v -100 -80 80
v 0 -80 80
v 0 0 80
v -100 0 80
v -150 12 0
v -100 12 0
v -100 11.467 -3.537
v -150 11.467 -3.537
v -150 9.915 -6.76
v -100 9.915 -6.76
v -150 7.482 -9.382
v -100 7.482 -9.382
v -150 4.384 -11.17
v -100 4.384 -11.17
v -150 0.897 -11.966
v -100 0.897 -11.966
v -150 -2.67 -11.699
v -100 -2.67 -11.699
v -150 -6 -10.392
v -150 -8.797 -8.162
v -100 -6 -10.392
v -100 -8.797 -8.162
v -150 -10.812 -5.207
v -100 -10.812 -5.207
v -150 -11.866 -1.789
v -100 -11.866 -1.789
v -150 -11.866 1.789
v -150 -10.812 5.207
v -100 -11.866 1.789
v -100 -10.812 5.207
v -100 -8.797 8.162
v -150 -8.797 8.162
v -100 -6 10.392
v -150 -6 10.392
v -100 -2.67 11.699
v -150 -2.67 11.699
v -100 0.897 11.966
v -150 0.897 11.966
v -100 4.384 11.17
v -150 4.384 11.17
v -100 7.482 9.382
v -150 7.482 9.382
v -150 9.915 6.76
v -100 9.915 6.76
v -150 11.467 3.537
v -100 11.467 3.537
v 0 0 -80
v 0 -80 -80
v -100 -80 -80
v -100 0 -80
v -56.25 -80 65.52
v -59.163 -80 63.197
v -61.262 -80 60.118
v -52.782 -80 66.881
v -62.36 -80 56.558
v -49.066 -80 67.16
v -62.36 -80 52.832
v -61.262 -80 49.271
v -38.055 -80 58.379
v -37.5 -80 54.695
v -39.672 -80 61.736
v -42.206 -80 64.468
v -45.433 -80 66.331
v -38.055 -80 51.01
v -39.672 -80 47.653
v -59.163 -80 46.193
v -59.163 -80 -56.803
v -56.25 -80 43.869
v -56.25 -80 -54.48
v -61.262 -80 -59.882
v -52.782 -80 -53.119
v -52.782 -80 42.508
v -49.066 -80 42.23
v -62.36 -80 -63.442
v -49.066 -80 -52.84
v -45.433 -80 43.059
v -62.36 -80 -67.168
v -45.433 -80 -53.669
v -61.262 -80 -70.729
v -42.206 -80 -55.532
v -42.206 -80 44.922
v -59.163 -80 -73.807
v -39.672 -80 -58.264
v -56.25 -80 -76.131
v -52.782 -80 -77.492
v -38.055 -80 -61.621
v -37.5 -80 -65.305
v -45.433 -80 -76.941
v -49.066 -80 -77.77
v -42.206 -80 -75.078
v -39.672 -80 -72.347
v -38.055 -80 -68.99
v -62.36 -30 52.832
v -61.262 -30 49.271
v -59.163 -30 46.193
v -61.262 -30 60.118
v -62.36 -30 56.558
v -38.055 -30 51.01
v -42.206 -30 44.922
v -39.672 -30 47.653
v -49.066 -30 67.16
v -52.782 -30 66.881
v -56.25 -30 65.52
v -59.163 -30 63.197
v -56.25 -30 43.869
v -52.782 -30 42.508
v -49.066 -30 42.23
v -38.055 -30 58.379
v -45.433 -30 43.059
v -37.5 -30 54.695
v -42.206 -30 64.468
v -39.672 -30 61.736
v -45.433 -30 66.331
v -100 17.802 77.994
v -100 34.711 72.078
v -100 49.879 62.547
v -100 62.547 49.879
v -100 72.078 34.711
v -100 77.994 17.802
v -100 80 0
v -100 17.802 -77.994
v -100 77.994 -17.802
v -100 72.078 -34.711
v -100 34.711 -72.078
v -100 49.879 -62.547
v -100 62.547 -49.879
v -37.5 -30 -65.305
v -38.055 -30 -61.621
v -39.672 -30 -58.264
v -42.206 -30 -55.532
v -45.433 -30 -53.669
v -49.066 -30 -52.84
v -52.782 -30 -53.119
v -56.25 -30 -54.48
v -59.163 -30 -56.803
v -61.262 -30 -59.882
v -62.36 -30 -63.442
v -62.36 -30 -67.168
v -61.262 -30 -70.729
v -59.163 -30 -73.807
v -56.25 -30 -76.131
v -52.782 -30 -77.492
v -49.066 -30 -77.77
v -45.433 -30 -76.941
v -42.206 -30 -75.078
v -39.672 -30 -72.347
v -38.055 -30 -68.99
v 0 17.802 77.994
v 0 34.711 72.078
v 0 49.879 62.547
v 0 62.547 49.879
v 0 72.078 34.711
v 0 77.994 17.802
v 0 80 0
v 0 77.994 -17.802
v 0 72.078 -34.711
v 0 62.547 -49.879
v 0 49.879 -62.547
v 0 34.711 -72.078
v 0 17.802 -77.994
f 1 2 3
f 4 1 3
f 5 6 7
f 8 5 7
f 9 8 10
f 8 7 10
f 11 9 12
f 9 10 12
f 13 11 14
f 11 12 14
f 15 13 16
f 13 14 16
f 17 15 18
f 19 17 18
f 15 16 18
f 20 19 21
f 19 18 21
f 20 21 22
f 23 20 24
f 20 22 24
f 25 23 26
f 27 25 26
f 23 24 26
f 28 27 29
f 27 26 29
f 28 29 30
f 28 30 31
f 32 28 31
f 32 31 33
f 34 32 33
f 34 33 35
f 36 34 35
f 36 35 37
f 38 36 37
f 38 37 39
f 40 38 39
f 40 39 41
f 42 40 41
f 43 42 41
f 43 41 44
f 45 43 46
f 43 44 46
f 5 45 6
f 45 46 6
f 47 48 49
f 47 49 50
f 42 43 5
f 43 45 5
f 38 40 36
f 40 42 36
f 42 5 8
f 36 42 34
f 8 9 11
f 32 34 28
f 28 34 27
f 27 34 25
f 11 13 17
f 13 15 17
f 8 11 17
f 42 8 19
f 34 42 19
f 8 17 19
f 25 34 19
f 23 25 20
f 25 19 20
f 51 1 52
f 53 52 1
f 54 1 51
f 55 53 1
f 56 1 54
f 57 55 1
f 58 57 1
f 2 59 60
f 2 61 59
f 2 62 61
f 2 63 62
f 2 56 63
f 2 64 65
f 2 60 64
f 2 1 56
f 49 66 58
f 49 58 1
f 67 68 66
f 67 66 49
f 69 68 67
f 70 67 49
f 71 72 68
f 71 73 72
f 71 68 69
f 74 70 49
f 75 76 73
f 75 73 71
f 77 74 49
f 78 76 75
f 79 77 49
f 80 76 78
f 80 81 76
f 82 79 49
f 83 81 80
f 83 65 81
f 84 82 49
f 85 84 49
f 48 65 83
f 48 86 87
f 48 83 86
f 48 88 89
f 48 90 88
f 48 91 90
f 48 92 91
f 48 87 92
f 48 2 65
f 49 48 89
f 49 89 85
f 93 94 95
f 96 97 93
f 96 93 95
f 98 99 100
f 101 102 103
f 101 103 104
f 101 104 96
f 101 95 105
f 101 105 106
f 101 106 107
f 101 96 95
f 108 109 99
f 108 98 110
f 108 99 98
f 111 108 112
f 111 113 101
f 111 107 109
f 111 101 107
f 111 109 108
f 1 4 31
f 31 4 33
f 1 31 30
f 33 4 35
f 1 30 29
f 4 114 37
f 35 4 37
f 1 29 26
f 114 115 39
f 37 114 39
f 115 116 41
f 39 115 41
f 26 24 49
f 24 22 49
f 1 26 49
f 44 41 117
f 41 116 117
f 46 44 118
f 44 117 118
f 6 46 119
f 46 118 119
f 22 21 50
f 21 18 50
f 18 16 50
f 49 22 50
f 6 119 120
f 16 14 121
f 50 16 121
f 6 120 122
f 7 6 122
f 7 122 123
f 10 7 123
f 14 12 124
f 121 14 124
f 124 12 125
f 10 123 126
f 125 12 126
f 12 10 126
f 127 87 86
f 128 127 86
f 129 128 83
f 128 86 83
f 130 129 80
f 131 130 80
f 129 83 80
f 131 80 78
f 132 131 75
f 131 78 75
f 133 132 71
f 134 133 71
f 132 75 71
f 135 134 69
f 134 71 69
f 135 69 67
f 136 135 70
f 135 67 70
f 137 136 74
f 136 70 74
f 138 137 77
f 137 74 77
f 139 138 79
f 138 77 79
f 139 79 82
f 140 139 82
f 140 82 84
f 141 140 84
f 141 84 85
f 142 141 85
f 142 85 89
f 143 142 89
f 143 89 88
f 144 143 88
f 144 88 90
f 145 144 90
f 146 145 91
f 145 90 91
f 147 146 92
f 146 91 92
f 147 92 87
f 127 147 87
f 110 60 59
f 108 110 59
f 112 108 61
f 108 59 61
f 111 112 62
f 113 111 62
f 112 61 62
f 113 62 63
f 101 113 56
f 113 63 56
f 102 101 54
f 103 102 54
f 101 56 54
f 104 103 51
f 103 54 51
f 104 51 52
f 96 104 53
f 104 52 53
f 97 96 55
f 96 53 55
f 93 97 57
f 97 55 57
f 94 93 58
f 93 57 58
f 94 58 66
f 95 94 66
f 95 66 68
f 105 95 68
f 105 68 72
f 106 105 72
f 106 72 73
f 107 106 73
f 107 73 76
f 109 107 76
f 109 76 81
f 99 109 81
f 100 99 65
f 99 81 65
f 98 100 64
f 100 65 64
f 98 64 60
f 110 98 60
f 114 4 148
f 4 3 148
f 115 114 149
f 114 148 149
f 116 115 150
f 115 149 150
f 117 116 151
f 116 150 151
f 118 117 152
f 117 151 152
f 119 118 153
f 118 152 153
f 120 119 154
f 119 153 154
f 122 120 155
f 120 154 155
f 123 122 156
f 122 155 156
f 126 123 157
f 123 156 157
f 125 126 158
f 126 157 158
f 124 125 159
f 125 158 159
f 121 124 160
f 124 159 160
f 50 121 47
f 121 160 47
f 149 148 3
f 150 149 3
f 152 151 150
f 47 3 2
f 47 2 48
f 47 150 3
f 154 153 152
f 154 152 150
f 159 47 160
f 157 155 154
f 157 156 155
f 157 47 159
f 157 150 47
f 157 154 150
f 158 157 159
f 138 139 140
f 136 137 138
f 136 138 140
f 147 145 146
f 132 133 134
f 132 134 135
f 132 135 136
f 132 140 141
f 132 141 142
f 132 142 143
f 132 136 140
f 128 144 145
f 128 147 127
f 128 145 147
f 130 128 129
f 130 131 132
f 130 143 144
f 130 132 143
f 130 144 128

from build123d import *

# Parameters (mm, degrees)
SKETCH3_W           = 160
SKETCH3_H           = 80
BOSS_EXTRUDE1_DEPTH = 100
SKETCH5_R           = 12.5
CUT_EXTRUDE2_DEPTH  = 50


with BuildPart() as part:
    # Sketch1 → Revolve1 (revolve)
    with BuildSketch(Plane.XY):
        Polygon((0, 0), (-150, 0), (-150, 12), (-100, 12), (-100, 80), (0, 80), align=None)
    revolve(axis=Axis((0, 0, 0), (-1, 0, 0)))

    # Sketch3 → Boss-Extrude1 (add)
    with BuildSketch(Plane(origin=(0, 0, 0), x_dir=(0, 0, -1), z_dir=(1, 0, 0))):
        with Locations((0, -40)):
            Rectangle(SKETCH3_W, SKETCH3_H)
    extrude(amount=-BOSS_EXTRUDE1_DEPTH)

    # Sketch5 → Cut-Extrude2 (cut)
    with BuildSketch(Plane.XZ.offset(80)):
        with Locations((-50, 54.694760198)):
            Circle(SKETCH5_R)
        with Locations((-50, -65.305239802)):
            Circle(SKETCH5_R)
    extrude(amount=-CUT_EXTRUDE2_DEPTH, mode=Mode.SUBTRACT)


solid = part.part
